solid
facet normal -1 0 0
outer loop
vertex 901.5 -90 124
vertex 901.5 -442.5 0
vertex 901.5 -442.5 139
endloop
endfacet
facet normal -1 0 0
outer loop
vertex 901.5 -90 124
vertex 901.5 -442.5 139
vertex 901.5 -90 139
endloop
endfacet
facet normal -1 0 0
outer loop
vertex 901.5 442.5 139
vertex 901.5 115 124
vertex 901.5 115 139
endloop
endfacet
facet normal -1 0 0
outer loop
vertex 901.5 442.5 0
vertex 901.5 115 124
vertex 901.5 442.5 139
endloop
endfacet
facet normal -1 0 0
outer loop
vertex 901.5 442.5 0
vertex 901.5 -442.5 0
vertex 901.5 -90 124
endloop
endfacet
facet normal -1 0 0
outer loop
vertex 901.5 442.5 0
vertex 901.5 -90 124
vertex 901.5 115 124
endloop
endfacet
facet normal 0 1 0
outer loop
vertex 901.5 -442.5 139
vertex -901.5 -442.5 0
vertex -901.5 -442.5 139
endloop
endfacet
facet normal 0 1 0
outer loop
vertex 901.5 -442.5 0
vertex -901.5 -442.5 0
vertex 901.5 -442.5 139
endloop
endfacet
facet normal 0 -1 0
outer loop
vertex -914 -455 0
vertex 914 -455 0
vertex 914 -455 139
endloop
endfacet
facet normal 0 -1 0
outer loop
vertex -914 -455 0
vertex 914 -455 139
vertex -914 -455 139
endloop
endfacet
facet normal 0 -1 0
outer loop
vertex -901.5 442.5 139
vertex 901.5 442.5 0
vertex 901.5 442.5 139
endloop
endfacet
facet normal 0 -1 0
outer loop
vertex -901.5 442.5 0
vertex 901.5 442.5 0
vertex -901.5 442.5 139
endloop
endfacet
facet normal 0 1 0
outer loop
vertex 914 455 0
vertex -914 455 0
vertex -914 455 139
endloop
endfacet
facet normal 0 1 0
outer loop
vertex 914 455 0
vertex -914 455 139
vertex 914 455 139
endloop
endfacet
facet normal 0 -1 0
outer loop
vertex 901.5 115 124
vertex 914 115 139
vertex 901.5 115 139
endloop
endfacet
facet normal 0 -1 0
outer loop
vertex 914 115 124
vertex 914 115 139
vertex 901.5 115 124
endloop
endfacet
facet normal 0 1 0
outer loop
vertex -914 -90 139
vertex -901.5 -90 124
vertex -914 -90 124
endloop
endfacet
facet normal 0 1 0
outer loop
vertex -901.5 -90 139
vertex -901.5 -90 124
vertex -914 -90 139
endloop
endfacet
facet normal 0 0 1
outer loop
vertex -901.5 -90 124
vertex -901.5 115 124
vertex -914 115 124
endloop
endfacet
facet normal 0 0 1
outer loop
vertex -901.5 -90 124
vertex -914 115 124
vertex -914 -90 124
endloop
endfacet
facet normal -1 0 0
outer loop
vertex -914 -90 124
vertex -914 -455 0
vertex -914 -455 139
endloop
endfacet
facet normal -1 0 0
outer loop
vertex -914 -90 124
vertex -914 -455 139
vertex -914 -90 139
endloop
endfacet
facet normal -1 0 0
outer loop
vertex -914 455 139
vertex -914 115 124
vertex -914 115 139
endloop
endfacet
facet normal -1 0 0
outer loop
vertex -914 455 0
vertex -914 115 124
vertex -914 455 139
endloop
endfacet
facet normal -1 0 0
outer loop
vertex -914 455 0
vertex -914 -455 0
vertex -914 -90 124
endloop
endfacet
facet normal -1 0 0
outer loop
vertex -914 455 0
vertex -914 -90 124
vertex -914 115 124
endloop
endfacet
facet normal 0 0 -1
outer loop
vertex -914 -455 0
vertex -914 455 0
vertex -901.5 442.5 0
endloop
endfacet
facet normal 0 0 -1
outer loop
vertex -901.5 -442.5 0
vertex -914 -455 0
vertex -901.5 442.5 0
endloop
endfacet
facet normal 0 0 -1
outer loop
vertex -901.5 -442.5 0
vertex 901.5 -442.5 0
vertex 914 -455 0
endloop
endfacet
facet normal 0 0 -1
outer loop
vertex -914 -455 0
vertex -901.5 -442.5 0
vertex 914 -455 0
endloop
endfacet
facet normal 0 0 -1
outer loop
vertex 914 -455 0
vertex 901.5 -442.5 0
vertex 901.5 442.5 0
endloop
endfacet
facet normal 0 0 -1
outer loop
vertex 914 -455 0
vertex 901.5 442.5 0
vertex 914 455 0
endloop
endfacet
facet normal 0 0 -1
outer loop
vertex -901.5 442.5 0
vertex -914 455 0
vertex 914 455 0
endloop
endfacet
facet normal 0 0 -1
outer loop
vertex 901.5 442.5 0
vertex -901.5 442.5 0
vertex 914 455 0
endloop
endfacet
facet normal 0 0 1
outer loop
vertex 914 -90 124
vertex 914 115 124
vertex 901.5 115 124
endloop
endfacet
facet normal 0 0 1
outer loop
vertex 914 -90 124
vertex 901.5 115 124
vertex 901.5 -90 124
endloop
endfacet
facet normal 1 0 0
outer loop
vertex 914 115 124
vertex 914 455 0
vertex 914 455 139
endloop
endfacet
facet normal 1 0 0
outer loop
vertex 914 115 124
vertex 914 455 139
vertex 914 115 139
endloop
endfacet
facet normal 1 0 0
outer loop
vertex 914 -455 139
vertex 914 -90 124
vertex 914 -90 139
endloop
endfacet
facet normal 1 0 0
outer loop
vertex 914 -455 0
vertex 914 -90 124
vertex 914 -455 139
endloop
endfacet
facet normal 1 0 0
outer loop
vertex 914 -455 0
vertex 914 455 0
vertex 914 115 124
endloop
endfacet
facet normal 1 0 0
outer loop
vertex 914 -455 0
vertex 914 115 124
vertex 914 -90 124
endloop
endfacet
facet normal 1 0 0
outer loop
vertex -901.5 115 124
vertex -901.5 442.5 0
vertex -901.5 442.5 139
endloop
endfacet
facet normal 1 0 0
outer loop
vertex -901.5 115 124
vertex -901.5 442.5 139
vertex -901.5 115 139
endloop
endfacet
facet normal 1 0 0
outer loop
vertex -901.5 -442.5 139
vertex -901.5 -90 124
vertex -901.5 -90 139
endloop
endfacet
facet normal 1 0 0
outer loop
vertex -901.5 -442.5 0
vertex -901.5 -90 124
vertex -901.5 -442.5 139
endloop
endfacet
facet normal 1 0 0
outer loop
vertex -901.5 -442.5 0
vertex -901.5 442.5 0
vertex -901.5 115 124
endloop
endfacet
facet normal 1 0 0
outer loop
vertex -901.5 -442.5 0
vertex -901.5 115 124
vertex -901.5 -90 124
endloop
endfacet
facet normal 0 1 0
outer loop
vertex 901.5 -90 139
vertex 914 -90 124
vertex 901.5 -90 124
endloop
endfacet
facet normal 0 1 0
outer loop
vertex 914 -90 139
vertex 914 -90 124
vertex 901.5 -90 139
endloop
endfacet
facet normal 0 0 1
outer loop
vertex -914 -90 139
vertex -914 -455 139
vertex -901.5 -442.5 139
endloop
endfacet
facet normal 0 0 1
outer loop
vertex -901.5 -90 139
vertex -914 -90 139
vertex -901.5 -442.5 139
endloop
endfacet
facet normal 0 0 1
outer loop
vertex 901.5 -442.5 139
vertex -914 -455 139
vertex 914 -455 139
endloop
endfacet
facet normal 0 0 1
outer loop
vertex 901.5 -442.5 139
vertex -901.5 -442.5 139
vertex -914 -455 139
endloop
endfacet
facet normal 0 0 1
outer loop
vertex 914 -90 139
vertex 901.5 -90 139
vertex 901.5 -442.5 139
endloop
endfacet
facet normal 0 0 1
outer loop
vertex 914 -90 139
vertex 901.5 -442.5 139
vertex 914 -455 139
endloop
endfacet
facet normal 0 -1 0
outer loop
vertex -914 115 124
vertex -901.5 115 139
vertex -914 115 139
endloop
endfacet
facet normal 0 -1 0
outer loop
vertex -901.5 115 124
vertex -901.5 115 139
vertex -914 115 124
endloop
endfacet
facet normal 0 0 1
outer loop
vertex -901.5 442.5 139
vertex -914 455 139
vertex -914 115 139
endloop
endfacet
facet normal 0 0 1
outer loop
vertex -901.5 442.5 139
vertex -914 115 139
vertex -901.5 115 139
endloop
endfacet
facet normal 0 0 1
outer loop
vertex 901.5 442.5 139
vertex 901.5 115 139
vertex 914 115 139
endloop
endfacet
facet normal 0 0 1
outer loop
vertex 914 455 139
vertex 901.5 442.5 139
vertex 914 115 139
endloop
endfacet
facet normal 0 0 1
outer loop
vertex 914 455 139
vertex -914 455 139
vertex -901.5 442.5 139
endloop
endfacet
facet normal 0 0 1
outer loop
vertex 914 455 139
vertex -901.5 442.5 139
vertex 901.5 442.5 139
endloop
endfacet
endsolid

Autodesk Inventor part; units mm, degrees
ref_plane "YZ Plane" through (0, 0, 0) normal (1, 0, 0) x (0, 1, 0)
ref_plane "XZ Plane" through (0, 0, 0) normal (0, 1, 0) x (-1, 0, 0)
ref_plane "XY Plane" through (0, 0, 0) normal (0, 0, 1) x (1, 0, 0)
sketch "Skizze1" plane through (0, 0, 0) normal (0, 0, 1) x (1, 0, 0)
  line L0 (-914, 455) -> (914, 455)
  line L1 (914, 455) -> (914, -455)
  line L2 (914, -455) -> (-914, -455)
  line L3 (-914, -455) -> (-914, 455)
  line L4 (-914, 455) -> (914, -455) construction
  line L5 (914, 455) -> (-914, -455) construction
  line L6 (-901.5, -442.5) -> (901.5, -442.5)
  line L7 (901.5, -442.5) -> (901.5, 442.5)
  line L8 (901.5, 442.5) -> (-901.5, 442.5)
  line L9 (-901.5, 442.5) -> (-901.5, -442.5)
  line L10 (-901.5, -442.5) -> (901.5, 442.5) construction
  line L11 (901.5, -442.5) -> (-901.5, 442.5) construction
  point P0 (0, 0)
  dimension "d0" = 1828
  dimension "d1" = 910
  dimension "d2" = 1803
  dimension "d3" = 885
extrude "Extrusion1" add sketch "Skizze1" along normal blind 139
sketch "Skizze2" plane through (0, 0, 139) normal (0, 0, 1) x (1, 0, 0)
  line L0 (-901.5, 442.5) -> (901.5, 442.5) projected
  line L1 (-901.5, -442.5) -> (-901.5, 442.5) projected
  line L2 (901.5, -442.5) -> (-901.5, -442.5) projected
  line L3 (901.5, 442.5) -> (901.5, -442.5) projected
  point P0 (0, 0)
sketch "Skizze3" plane through (914, -455, 0) normal (1, 0, 0) x (0, 0, -1)
  line L0 (0, 910) -> (0, 0) construction
  line L1 (0, 910) -> (-139, 910) construction
  line L2 (-139, 0) -> (-139, 910) construction
  line L3 (0, 0) -> (-139, 0) construction
  line L4 (-120.6636, 910) -> (-120.6636, 570) construction
  line L5 (-94.9295, 910) -> (-94.9295, 365) construction
  line L6 (-139, 511.8346) -> (-124, 511.8346) construction
  line L7 (-139, 570) -> (-124, 570)
  line L8 (-124, 570) -> (-124, 365)
  line L9 (-124, 365) -> (-139, 365)
  line L10 (-139, 365) -> (-139, 570)
  point P0 (0, 455)
  dimension "d8" = 340
  dimension "d9" = 545
  dimension "d10" = 15
extrude "Extrusion3" cut sketch "Skizze3" against normal through all
properties part number "Frame" material "Holz (Birke)"
